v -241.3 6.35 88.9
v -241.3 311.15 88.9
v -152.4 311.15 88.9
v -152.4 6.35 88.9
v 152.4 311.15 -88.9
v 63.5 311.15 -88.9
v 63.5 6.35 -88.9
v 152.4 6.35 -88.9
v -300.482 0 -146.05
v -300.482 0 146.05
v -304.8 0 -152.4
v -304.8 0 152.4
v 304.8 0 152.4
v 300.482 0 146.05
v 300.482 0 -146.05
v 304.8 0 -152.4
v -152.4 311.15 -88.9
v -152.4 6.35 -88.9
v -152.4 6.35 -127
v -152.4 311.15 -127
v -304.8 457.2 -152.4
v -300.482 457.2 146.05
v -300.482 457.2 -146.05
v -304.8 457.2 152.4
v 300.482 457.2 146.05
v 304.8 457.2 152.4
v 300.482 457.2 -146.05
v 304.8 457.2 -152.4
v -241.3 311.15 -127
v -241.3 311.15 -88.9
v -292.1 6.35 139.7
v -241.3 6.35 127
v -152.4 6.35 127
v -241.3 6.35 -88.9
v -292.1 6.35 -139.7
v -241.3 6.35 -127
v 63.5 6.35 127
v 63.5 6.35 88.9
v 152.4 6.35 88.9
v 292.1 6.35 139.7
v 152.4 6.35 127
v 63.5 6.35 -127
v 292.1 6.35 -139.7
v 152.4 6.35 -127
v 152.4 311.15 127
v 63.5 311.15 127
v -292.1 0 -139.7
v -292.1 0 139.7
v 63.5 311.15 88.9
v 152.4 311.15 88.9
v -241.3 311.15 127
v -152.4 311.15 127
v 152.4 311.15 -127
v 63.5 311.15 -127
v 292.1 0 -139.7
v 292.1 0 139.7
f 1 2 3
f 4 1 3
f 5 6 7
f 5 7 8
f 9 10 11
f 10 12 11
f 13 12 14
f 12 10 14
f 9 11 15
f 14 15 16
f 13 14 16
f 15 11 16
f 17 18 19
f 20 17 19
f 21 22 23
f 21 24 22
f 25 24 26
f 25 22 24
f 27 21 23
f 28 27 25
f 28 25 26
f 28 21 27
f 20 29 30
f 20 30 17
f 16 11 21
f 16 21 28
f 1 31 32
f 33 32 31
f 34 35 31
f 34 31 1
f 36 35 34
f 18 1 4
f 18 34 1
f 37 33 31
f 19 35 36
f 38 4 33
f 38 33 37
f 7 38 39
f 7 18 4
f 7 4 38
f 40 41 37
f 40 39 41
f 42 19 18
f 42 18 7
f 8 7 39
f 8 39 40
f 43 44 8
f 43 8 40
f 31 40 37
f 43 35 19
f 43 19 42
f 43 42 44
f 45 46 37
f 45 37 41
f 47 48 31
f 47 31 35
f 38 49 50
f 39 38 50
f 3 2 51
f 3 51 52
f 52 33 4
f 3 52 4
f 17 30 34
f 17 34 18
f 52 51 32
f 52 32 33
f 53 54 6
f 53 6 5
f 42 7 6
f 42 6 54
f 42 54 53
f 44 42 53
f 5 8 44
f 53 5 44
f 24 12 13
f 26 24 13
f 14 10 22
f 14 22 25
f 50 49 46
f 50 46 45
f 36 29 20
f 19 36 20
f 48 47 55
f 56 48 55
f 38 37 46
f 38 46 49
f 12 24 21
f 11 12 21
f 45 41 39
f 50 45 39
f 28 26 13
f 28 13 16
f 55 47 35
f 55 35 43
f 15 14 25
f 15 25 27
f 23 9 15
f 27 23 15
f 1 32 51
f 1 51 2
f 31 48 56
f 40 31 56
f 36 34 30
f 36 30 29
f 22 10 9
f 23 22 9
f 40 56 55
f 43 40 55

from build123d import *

# Parameters (mm, degrees)
SKETCH1_W                 = 584.2
SKETCH1_H                 = 279.4
BOSS_EXTRUDE1_DEPTH       = 6.35
SKETCH2_W                 = 88.9
SKETCH2_H                 = 38.1
BOSS_EXTRUDE2_DEPTH       = 304.8
LPATTERN1_COUNT           = 2
LPATTERN1_PITCH           = 304.8
LPATTERN2_COUNT           = 2
LPATTERN2_PITCH           = 215.9
LPATTERN2_COPY_1_SKETCH_W = 88.9
LPATTERN2_COPY_1_SKETCH_H = 38.1
LPATTERN2_COPY_1_DEPTH    = 304.8
SKETCH3_W                 = 609.6
SKETCH3_H                 = 304.8
SKETCH3_W_2               = 600.964
SKETCH3_H_2               = 292.1
BOSS_EXTRUDE3_DEPTH       = 457.2


with BuildPart() as part:
    # Sketch1 → Boss-Extrude1 (new body)
    with BuildSketch(Plane(origin=(0, 0, 0), x_dir=(1, 0, 0), z_dir=(0, 1, 0))):
        Rectangle(SKETCH1_W, SKETCH1_H)
    extrude(amount=BOSS_EXTRUDE1_DEPTH)

    # Sketch2 → Boss-Extrude2 (add)
    with BuildSketch(Plane(origin=(0, 6.35, 0), x_dir=(1, 0, 0), z_dir=(0, 1, 0))):
        with Locations((-196.85, -107.95)):
            Rectangle(SKETCH2_W, SKETCH2_H)
    boss_extrude2 = extrude(amount=BOSS_EXTRUDE2_DEPTH)

    # LPattern1: Boss-Extrude2 ×2
    with Locations(*[(i * LPATTERN1_PITCH, 0, 0) for i in range(1, LPATTERN1_COUNT)]):
        add(boss_extrude2)

    # LPattern2: Boss-Extrude2 ×2
    with Locations(*[(0, 0, -i * LPATTERN2_PITCH) for i in range(1, LPATTERN2_COUNT)]):
        add(boss_extrude2)

    # LPattern2 copy 1 sketch → LPattern2 copy 1 (add)
    with BuildSketch(Plane(origin=(304.8, 6.35, -215.9), x_dir=(1, 0, 0), z_dir=(0, 1, 0))):
        with Locations((-196.85, -107.95)):
            Rectangle(LPATTERN2_COPY_1_SKETCH_W, LPATTERN2_COPY_1_SKETCH_H)
    extrude(amount=LPATTERN2_COPY_1_DEPTH)


with BuildPart() as body_2:
    # Sketch3 → Boss-Extrude3 (new body)
    with BuildSketch(Plane(origin=(0, 0, 0), x_dir=(1, 0, 0), z_dir=(0, 1, 0))):
        Rectangle(SKETCH3_W, SKETCH3_H)
        Rectangle(SKETCH3_W_2, SKETCH3_H_2, mode=Mode.SUBTRACT)
    extrude(amount=BOSS_EXTRUDE3_DEPTH)


solid = Compound([part.part, body_2.part])
